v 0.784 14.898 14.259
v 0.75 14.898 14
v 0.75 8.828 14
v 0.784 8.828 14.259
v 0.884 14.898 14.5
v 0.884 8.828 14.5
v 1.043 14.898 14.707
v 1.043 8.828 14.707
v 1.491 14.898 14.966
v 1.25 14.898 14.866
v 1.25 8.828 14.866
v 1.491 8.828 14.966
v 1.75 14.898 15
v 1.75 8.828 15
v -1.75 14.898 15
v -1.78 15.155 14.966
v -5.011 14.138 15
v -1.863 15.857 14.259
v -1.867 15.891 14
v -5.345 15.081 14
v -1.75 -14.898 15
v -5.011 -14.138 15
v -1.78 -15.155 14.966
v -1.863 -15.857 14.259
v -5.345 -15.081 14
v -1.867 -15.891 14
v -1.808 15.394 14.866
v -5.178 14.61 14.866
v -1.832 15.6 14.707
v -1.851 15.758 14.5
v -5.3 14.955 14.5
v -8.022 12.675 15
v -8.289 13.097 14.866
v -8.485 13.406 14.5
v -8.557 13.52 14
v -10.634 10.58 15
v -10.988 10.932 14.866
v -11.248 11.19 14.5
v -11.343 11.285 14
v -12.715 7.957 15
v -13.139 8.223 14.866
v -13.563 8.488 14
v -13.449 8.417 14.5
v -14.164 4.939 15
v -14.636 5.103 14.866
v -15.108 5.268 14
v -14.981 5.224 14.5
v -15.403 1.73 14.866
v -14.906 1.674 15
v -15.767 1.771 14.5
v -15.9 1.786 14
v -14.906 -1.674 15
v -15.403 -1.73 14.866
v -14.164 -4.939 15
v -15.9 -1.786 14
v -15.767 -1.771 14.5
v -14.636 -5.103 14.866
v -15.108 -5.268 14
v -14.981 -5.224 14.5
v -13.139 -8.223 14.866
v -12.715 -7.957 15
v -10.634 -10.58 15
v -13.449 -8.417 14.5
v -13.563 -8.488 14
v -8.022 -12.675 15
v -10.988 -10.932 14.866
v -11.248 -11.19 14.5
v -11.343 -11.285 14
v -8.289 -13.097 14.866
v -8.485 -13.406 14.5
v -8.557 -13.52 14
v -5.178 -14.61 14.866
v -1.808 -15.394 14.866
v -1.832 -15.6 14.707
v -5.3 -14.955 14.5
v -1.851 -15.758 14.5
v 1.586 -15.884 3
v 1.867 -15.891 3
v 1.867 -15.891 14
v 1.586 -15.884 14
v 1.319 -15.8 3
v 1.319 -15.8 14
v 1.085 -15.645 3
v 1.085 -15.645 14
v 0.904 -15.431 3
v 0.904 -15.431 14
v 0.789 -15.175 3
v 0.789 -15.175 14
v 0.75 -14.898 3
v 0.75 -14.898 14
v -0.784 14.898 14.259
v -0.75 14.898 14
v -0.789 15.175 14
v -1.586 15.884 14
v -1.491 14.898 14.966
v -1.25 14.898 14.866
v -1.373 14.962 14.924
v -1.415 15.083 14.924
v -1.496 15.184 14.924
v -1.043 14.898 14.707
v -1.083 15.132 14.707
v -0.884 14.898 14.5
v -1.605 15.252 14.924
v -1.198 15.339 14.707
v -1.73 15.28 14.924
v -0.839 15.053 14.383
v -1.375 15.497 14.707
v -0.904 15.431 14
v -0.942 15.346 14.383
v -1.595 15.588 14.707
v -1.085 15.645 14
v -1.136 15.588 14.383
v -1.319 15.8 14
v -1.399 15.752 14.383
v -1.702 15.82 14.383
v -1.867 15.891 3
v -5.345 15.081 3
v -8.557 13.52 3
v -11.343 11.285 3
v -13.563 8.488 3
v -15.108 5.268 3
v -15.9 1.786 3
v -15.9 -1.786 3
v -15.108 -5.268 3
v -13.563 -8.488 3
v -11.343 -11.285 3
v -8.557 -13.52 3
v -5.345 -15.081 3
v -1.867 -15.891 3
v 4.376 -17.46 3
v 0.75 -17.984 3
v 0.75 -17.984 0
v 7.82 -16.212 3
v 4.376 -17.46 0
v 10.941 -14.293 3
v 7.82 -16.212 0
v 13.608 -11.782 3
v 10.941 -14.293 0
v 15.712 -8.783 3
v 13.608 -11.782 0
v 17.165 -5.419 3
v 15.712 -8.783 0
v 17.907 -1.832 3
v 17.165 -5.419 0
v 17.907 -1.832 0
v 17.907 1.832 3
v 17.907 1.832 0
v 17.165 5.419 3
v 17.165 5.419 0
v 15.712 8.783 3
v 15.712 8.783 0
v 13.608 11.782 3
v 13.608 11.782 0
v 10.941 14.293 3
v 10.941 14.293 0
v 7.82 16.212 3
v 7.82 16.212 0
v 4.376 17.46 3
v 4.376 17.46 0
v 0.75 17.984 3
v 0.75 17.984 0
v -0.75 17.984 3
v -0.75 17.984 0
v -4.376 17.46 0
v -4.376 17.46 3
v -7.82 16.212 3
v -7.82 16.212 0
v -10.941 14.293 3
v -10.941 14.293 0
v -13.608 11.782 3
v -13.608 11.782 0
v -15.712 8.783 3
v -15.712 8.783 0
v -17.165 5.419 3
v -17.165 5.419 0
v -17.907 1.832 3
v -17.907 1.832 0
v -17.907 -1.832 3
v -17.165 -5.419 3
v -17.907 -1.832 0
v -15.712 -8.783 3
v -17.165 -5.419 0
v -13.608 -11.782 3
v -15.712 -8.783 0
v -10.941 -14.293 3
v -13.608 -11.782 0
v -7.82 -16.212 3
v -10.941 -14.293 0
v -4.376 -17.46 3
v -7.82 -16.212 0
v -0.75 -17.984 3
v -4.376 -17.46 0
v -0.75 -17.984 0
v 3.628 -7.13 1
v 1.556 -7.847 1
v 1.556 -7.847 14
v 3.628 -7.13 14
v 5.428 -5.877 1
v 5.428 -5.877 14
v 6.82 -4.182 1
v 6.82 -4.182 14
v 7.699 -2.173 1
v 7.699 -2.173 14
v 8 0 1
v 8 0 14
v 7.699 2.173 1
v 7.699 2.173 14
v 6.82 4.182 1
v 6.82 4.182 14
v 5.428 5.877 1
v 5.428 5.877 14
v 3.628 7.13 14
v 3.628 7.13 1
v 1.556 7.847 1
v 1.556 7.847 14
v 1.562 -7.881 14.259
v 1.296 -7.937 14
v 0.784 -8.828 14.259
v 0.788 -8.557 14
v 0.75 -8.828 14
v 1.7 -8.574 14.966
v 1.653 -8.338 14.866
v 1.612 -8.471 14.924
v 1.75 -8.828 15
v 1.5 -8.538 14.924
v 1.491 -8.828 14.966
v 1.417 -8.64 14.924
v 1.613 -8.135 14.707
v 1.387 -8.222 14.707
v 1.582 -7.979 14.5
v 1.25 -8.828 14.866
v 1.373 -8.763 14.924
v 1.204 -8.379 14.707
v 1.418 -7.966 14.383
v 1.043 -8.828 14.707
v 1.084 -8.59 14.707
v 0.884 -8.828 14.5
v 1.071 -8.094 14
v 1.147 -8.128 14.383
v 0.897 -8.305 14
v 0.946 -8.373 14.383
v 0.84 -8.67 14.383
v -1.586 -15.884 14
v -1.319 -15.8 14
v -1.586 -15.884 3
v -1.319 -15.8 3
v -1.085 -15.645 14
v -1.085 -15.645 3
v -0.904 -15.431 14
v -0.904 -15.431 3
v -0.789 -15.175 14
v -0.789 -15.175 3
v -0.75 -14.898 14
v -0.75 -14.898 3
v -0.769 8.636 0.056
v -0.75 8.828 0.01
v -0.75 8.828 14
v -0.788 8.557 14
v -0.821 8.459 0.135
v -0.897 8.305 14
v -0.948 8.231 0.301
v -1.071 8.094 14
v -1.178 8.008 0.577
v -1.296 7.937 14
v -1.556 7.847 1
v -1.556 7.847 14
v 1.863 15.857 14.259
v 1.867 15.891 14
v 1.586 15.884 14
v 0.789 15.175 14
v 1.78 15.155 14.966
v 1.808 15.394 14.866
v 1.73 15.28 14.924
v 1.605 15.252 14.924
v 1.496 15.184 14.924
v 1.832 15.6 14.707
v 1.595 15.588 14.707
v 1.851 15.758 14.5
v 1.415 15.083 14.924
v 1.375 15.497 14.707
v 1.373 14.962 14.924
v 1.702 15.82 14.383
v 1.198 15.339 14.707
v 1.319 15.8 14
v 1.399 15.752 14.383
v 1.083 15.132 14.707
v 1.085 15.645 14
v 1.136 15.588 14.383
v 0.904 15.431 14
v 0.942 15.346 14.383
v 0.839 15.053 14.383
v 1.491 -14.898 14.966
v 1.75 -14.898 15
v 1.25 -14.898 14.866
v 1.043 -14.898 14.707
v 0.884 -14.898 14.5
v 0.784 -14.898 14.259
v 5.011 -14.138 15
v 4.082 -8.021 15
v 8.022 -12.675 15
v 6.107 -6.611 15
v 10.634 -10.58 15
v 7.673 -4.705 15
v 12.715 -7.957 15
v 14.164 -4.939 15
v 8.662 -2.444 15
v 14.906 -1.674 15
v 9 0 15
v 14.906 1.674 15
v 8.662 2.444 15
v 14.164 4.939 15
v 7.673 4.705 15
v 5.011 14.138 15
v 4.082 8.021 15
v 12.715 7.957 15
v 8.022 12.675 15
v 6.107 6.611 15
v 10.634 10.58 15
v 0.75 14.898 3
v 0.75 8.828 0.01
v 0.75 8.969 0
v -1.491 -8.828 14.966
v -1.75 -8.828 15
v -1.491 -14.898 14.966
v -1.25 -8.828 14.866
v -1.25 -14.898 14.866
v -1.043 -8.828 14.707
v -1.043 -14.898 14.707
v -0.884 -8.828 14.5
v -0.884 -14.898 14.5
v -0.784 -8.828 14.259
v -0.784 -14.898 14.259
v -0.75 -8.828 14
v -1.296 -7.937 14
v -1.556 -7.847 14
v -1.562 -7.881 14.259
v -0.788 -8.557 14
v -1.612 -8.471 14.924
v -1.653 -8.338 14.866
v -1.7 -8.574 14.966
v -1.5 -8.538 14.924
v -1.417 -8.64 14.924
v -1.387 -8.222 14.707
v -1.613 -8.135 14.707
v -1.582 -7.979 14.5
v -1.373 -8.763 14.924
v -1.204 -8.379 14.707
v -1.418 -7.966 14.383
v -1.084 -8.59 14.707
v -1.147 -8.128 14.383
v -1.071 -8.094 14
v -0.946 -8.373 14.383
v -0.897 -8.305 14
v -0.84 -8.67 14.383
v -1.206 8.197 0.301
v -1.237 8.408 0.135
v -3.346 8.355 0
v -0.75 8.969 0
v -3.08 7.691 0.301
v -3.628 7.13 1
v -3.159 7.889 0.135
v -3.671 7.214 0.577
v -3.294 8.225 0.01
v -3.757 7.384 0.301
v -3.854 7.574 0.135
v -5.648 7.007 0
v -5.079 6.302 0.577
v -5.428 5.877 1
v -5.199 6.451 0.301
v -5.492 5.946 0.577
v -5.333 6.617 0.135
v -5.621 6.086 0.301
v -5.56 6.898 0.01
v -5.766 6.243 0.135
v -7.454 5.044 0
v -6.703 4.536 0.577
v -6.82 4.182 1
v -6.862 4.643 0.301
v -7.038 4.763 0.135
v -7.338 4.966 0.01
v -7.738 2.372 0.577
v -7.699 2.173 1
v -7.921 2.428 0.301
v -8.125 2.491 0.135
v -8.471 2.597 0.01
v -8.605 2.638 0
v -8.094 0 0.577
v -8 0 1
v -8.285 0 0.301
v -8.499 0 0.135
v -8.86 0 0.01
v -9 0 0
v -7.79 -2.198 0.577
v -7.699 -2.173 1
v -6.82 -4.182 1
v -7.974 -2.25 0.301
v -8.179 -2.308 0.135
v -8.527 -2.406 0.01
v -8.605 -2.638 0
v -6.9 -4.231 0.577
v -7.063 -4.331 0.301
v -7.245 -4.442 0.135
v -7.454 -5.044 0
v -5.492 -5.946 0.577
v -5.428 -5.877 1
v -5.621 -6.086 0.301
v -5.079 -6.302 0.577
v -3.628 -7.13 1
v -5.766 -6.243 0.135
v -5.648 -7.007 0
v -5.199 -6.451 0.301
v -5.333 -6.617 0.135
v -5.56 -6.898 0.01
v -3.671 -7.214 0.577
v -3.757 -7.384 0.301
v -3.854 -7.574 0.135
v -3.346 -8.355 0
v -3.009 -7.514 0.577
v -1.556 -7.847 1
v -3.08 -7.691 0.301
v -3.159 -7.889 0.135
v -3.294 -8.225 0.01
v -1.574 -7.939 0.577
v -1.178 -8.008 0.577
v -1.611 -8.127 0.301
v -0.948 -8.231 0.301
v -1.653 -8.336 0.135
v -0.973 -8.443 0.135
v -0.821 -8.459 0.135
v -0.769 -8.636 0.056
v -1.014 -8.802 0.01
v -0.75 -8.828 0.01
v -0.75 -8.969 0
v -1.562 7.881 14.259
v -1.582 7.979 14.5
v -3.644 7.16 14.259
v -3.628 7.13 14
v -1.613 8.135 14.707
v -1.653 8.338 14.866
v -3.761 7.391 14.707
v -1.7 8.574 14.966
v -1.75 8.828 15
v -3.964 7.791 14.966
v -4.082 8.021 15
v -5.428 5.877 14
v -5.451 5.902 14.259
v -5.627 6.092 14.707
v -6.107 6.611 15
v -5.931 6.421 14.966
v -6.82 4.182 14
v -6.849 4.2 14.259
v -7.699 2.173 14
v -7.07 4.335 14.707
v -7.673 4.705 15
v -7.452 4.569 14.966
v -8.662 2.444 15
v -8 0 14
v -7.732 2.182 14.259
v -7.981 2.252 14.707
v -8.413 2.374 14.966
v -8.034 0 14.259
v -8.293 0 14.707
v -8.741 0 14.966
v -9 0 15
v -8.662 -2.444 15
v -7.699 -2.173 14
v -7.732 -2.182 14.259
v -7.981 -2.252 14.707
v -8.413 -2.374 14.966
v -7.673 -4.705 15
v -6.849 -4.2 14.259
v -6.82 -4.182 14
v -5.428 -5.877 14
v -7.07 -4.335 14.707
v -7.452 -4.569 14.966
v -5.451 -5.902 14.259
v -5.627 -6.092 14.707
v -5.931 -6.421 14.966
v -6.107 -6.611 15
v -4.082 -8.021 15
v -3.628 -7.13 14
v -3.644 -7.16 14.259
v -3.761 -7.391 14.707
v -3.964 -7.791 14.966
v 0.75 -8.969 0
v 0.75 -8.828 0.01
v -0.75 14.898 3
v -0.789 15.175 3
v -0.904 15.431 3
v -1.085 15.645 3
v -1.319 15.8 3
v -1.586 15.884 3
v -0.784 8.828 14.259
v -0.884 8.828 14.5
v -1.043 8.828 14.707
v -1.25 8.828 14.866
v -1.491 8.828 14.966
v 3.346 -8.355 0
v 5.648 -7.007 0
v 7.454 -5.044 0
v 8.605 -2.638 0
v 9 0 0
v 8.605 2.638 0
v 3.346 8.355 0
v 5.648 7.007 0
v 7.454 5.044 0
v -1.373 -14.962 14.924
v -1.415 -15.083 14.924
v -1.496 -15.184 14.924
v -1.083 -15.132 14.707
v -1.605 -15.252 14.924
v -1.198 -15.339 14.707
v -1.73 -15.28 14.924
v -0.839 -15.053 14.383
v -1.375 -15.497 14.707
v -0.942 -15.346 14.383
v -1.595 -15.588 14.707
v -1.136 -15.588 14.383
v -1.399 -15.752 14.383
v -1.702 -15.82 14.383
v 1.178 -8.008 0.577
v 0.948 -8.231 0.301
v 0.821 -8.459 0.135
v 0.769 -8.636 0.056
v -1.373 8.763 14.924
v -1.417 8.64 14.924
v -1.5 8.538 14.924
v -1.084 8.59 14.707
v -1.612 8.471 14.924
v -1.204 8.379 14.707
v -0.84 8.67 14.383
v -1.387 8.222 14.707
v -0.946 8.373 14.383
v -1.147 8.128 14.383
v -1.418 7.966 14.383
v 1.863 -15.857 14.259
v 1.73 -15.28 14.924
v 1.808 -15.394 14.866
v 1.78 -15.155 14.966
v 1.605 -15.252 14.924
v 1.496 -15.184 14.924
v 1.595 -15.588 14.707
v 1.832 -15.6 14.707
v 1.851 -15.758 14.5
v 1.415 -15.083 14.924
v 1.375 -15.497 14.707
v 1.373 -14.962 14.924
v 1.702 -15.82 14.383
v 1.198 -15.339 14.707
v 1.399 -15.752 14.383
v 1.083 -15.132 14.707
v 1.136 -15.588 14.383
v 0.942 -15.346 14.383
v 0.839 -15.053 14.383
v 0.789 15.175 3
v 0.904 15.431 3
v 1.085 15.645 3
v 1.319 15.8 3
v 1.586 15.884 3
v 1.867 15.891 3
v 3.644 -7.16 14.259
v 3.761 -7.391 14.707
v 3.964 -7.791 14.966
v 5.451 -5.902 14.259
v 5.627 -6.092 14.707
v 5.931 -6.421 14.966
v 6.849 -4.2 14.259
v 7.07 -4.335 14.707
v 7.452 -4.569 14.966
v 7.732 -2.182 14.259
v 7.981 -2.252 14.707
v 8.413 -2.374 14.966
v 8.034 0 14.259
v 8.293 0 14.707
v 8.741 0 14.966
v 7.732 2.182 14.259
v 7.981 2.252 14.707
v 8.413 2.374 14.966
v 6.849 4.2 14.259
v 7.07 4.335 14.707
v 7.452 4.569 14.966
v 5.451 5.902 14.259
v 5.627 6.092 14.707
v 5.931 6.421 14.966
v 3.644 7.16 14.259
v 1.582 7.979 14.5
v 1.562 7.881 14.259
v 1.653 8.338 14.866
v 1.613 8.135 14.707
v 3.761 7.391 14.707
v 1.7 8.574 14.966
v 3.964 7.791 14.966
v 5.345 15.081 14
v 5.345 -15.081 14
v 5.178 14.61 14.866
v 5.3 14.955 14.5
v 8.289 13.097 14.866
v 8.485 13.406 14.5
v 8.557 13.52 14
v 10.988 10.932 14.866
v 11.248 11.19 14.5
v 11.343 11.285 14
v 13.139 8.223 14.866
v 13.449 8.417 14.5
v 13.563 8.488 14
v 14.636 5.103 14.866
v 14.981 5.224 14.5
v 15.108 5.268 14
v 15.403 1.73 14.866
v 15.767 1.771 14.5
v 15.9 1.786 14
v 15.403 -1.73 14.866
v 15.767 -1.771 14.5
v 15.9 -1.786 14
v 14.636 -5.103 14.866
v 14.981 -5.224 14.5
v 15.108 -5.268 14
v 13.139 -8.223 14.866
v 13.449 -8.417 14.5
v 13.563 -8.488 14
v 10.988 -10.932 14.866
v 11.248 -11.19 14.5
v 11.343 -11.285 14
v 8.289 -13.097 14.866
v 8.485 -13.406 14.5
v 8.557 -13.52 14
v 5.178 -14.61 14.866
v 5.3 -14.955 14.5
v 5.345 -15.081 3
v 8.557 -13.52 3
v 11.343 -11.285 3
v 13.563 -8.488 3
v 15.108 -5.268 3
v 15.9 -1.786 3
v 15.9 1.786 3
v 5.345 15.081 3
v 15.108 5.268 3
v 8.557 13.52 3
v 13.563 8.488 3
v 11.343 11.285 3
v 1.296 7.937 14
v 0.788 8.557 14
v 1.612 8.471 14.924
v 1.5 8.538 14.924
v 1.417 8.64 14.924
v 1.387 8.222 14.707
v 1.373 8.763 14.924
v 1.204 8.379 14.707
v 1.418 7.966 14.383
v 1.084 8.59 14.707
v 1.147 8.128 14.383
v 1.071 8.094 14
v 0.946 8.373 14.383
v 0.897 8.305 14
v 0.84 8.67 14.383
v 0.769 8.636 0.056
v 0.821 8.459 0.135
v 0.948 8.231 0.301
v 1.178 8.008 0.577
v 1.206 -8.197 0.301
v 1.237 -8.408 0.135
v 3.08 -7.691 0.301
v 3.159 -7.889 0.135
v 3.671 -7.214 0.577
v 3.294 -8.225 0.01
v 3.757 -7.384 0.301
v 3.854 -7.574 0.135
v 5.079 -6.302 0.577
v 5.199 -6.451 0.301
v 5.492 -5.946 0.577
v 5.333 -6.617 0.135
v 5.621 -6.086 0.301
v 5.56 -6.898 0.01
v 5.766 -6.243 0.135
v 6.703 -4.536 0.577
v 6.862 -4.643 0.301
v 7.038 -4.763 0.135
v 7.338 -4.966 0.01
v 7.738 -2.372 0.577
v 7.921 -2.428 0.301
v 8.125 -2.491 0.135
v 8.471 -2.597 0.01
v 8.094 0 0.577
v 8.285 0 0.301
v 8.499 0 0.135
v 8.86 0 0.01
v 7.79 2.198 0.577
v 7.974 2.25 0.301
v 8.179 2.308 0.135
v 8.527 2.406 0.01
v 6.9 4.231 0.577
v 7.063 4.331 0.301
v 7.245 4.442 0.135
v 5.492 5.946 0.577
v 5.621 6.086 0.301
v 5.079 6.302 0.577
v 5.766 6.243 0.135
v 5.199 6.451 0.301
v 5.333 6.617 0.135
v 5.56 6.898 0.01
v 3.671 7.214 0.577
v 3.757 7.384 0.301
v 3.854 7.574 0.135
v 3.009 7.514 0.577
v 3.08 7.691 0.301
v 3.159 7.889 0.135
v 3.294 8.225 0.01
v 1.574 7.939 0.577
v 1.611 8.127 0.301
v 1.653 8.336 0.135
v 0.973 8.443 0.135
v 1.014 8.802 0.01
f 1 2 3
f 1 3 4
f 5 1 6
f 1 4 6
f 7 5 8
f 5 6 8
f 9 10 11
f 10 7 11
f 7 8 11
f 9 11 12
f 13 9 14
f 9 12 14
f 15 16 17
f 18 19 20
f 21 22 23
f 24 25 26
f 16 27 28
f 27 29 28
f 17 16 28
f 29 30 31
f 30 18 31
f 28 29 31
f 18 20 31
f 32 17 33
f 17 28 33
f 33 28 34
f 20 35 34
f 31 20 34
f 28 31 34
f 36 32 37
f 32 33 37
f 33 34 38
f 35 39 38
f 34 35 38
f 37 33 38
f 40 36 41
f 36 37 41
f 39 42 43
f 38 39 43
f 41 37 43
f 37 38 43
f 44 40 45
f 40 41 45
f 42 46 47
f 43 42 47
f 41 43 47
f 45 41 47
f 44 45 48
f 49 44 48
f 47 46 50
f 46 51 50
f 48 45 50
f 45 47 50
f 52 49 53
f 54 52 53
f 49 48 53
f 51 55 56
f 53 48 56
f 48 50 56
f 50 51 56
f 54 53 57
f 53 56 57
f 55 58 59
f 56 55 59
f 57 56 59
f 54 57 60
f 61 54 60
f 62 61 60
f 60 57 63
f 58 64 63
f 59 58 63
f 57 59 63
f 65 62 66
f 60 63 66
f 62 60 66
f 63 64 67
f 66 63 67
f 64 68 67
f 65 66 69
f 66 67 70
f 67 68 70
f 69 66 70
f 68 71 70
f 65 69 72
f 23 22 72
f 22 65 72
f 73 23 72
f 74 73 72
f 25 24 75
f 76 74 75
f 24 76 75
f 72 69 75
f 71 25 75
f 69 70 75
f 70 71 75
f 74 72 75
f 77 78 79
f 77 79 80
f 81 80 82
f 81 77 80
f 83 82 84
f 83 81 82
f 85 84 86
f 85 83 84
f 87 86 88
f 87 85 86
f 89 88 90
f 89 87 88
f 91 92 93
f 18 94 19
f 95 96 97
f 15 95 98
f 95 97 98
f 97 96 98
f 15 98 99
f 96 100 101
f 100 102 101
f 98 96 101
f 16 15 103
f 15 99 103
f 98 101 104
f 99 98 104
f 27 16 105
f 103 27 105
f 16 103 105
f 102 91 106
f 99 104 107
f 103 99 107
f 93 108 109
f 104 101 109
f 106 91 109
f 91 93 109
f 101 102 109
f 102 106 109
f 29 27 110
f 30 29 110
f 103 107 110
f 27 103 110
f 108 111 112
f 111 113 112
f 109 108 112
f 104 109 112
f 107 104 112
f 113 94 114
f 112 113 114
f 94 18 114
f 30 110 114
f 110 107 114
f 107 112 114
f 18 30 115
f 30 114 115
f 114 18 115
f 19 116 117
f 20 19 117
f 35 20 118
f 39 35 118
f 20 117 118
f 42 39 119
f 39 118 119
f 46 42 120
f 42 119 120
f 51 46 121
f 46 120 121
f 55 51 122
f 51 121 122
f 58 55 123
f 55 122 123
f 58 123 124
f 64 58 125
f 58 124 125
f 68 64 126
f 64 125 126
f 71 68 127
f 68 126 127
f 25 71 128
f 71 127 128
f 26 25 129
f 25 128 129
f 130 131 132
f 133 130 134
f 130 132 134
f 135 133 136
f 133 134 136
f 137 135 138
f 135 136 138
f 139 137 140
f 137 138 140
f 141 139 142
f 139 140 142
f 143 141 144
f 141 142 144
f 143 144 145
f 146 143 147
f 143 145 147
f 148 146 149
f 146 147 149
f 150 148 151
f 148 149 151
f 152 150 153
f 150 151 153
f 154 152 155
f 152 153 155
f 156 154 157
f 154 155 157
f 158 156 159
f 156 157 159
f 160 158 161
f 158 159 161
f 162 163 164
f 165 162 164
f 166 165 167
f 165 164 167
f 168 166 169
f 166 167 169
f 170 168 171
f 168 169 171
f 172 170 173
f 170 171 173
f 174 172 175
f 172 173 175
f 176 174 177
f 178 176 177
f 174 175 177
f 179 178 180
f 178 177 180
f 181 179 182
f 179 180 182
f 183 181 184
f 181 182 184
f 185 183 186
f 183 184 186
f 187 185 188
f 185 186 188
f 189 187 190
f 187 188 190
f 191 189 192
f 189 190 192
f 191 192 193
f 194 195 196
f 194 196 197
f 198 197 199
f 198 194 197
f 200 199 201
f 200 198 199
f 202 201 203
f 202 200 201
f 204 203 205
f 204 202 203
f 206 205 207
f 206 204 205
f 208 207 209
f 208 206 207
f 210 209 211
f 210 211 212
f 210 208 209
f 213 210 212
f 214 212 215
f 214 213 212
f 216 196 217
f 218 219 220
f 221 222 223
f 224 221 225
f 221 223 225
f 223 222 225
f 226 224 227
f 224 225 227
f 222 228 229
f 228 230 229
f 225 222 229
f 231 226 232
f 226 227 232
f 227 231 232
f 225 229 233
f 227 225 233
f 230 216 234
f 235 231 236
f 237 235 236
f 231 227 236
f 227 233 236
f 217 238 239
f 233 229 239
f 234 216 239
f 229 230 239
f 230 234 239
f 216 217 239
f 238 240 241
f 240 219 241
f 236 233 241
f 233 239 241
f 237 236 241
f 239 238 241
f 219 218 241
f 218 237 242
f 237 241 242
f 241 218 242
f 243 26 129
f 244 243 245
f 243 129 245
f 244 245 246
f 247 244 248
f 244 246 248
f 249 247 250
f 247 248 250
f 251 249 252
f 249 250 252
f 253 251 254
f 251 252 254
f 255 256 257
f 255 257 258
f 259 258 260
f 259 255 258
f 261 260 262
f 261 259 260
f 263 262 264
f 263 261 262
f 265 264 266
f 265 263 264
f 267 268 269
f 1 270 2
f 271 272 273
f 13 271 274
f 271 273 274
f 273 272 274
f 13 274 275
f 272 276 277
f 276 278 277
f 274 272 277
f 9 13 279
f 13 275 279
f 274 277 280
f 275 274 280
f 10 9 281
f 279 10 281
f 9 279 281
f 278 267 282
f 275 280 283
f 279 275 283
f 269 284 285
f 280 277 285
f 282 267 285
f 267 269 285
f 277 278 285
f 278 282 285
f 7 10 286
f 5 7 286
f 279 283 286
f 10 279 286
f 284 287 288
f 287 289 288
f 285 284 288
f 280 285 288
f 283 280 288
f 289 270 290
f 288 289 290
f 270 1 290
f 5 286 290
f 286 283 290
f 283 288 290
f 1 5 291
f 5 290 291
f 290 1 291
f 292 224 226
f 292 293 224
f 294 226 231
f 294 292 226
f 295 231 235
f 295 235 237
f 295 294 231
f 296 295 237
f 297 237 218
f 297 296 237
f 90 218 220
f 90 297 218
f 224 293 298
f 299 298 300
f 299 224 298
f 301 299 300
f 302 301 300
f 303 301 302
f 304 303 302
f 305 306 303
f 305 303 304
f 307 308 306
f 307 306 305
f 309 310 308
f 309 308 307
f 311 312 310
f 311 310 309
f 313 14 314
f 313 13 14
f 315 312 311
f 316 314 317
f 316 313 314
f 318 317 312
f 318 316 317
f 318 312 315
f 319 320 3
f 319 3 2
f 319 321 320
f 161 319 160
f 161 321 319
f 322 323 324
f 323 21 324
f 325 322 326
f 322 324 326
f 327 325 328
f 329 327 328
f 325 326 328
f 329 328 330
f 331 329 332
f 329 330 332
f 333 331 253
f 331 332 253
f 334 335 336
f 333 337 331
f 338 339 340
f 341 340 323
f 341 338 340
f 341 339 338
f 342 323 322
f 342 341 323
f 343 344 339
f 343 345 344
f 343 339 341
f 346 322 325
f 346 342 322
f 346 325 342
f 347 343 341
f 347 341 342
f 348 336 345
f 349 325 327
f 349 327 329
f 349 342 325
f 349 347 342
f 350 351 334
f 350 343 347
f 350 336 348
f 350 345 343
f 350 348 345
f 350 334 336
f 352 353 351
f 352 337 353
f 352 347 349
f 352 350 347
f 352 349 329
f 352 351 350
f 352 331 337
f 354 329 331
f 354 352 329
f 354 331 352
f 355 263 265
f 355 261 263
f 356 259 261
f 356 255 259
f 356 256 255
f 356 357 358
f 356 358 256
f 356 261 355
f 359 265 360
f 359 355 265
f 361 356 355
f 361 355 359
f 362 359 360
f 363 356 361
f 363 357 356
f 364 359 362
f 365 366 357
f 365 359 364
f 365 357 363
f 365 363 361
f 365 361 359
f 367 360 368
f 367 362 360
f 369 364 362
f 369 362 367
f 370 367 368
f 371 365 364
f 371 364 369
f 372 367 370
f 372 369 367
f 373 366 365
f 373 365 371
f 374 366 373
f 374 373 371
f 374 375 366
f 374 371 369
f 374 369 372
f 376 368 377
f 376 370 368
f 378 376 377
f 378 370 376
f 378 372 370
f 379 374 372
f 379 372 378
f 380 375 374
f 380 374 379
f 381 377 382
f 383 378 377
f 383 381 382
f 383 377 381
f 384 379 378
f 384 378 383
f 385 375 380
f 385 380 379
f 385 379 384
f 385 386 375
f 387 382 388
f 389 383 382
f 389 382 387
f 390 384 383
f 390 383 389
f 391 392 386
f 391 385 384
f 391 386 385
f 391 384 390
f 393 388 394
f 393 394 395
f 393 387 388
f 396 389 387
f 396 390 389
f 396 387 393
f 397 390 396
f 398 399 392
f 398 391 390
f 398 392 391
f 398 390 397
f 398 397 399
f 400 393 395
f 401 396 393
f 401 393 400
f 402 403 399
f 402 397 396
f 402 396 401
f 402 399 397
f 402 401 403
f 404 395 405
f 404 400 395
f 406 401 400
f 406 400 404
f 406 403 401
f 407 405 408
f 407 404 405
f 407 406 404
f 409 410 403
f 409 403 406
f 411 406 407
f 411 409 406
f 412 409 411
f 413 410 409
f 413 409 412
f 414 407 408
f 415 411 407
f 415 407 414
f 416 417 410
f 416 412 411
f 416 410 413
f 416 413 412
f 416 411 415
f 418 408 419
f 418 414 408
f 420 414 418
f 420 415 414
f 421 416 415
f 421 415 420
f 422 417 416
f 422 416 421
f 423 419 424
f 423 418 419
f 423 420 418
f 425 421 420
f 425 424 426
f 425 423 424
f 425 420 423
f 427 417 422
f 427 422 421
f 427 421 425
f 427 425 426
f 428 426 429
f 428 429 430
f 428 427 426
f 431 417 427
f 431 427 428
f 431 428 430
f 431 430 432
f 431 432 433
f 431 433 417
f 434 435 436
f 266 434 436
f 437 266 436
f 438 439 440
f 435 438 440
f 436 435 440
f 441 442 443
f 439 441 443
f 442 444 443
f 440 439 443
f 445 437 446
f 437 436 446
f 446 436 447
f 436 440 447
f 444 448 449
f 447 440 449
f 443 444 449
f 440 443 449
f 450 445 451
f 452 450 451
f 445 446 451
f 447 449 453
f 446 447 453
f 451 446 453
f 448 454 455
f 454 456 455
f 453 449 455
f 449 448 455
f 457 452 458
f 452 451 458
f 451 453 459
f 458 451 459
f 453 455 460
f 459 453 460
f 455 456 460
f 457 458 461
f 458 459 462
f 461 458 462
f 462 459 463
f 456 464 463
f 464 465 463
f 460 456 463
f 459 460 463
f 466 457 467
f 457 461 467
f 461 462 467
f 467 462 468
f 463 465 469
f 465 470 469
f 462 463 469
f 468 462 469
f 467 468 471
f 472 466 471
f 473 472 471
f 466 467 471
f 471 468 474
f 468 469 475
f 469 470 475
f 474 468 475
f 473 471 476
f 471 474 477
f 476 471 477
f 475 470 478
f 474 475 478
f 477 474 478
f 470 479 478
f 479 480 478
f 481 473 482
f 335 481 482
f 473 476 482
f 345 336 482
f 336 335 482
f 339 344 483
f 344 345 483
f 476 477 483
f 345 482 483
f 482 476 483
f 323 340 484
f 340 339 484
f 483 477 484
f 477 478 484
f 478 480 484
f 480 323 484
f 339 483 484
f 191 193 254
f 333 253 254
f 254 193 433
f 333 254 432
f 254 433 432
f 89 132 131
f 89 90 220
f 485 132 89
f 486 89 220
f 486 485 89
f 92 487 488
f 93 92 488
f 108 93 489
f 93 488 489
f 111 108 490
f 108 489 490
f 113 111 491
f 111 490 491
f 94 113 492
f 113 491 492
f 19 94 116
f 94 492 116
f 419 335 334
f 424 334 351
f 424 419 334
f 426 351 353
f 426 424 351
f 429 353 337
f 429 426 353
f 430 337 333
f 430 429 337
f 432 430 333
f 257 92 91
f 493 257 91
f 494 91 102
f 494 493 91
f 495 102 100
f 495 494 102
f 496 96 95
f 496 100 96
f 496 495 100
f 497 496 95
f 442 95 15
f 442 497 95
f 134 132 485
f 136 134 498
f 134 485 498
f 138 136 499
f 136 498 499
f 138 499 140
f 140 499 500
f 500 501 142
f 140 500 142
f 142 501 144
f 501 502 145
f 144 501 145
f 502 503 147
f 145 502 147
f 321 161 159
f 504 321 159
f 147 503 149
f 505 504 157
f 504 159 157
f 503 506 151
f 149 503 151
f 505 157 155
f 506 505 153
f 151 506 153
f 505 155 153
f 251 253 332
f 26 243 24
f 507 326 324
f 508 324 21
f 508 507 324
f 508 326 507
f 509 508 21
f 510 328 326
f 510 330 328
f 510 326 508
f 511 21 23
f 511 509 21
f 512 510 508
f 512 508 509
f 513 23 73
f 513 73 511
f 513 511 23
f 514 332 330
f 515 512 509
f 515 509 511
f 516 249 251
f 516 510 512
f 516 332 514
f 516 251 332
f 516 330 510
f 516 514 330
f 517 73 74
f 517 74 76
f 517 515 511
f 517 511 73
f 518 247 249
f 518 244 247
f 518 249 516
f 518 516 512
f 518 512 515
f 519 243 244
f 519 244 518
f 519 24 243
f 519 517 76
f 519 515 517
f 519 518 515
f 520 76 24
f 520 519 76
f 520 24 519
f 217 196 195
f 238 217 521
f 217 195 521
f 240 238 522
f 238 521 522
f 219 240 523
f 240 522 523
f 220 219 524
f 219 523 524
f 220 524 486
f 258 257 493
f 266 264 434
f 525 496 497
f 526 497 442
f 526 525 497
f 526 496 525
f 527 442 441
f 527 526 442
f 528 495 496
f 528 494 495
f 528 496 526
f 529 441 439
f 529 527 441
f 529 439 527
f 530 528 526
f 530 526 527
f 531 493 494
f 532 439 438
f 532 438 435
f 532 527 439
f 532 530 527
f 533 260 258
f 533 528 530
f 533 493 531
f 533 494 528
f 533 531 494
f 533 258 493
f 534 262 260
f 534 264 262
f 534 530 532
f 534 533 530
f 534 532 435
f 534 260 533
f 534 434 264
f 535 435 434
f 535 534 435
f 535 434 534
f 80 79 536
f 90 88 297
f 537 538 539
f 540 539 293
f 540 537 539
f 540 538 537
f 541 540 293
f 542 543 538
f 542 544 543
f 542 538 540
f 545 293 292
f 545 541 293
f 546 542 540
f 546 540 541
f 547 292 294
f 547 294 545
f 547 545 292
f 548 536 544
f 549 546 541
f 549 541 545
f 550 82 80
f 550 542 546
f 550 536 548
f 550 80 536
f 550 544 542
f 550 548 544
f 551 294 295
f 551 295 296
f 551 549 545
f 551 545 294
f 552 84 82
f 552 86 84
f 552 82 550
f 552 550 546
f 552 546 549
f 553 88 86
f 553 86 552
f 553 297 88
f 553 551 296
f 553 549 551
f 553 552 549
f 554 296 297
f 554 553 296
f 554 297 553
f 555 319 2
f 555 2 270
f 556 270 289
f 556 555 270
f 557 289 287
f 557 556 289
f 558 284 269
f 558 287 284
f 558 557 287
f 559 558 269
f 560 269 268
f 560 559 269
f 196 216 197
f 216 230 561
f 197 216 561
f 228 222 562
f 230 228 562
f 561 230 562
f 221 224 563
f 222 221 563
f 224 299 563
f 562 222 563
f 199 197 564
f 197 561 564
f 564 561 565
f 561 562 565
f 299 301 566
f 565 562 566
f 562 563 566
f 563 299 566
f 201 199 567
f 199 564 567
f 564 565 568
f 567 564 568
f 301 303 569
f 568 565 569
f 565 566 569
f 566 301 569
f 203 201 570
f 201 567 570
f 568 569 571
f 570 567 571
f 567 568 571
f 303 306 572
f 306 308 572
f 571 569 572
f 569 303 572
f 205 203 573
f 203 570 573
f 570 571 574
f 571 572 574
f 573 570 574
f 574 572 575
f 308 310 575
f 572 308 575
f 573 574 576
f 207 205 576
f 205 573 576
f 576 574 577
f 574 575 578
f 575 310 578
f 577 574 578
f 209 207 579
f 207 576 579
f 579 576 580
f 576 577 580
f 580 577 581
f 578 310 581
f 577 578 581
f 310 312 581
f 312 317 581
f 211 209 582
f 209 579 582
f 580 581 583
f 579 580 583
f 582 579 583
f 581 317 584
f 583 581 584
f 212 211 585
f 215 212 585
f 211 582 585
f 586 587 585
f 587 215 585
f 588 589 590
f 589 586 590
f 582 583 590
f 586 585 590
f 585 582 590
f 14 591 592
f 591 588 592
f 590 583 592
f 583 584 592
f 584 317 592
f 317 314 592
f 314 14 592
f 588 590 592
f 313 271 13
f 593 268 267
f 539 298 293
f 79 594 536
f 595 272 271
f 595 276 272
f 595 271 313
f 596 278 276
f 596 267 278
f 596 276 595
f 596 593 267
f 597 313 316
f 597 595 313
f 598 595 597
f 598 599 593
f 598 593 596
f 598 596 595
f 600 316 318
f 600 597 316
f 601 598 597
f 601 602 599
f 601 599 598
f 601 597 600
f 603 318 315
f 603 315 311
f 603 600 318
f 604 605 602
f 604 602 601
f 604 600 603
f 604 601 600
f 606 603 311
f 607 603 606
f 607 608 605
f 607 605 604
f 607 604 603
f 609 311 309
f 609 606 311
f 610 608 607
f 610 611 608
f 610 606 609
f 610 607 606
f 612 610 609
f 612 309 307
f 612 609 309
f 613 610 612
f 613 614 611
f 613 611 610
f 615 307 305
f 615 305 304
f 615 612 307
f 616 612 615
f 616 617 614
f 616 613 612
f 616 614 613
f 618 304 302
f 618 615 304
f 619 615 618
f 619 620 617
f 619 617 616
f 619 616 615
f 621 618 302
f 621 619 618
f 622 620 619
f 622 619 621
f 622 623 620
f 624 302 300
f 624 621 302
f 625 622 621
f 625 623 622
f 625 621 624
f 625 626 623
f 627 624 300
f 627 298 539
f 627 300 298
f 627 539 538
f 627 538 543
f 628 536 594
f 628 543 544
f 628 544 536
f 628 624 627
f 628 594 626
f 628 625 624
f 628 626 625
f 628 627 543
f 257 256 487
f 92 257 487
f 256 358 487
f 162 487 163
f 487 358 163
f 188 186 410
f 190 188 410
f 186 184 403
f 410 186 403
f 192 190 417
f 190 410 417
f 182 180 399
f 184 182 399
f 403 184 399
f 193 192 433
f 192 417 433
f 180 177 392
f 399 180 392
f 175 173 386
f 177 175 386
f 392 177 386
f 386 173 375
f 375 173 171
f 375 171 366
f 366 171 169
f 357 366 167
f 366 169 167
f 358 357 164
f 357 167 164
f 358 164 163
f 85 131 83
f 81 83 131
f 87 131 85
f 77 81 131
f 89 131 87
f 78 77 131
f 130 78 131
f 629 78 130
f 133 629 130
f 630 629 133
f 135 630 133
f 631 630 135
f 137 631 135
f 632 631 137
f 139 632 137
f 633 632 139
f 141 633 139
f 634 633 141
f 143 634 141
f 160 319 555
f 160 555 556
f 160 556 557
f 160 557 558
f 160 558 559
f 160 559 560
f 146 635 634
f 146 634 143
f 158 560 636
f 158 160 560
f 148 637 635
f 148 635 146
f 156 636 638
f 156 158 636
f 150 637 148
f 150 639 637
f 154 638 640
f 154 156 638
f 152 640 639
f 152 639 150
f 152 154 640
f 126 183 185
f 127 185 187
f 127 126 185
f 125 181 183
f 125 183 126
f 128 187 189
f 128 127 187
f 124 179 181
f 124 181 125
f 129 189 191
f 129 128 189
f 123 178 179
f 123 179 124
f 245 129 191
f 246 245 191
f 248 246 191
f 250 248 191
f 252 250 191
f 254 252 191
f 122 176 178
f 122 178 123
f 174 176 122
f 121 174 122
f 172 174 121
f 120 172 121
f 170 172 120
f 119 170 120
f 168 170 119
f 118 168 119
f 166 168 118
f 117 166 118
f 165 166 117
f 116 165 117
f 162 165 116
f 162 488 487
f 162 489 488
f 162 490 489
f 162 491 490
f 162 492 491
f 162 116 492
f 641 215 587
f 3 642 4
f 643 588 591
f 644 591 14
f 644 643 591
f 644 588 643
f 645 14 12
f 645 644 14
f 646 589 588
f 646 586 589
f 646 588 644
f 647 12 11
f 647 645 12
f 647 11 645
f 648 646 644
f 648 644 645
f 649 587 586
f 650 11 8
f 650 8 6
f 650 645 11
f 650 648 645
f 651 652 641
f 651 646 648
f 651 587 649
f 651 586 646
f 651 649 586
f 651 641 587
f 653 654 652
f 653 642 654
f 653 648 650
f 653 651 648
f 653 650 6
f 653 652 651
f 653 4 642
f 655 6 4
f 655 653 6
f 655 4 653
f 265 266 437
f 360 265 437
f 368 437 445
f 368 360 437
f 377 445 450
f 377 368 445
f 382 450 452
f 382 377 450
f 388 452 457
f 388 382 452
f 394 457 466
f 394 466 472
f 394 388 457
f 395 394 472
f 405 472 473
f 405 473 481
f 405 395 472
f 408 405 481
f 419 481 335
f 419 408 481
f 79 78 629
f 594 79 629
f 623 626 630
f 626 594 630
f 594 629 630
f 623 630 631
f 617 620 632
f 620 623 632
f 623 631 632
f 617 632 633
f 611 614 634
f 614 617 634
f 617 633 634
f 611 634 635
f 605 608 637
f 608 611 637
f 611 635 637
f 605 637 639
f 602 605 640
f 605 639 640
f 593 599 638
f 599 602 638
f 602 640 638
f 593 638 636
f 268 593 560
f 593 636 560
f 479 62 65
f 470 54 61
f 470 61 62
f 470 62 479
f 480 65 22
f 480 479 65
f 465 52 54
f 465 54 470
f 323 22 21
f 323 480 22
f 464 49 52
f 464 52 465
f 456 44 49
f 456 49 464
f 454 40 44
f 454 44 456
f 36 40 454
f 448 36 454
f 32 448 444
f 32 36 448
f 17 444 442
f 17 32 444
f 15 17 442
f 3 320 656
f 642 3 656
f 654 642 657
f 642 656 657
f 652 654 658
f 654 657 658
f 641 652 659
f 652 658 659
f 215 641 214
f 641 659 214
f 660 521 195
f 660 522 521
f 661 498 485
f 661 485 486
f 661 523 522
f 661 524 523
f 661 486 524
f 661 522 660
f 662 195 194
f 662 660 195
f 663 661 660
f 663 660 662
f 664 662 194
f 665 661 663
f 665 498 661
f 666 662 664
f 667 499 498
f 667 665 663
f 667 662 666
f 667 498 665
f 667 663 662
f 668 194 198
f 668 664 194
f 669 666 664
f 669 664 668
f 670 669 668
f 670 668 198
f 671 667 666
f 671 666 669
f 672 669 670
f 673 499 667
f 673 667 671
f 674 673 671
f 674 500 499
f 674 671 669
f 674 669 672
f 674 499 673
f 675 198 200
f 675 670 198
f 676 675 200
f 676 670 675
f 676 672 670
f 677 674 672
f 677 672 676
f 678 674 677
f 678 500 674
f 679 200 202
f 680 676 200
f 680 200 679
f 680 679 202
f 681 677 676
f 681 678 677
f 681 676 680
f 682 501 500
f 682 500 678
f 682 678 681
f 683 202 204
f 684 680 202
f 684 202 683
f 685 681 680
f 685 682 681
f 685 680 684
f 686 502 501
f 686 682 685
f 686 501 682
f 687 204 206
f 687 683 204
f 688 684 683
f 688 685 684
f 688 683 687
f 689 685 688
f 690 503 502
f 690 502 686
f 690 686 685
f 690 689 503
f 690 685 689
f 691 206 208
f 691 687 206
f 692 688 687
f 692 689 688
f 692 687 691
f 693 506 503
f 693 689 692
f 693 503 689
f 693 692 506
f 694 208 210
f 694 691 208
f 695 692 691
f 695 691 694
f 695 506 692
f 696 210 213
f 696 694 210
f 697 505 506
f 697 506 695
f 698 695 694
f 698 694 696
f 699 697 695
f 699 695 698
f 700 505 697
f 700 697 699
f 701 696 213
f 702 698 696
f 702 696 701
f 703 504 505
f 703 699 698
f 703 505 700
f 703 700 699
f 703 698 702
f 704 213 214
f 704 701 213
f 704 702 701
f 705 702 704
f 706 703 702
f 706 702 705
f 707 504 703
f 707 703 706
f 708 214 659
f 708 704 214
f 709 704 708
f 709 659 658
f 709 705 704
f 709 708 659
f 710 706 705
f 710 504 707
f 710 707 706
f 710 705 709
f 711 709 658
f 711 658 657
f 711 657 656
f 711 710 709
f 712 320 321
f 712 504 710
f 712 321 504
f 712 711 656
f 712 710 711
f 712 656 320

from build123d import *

# Parameters (mm, degrees)
F0_R     = 16
F0_R_2   = 8
F1_DEPTH = 15
F0_R_3   = 18
F2_DEPTH = 3
F3_W     = 1.5
F3_H     = 40
F4_DEPTH = 15.001
F5_R     = 1


with BuildPart() as f1:
    # F0 (on Top) → F1 (new body)
    with BuildSketch(Plane.XY):
        Circle(F0_R)
        Circle(F0_R_2, mode=Mode.SUBTRACT)
    extrude(amount=F1_DEPTH)

    # F0 (on Top) → F2 (join)
    with BuildSketch(Plane.XY):
        Circle(F0_R_3)
        Circle(F0_R, mode=Mode.SUBTRACT)
    extrude(amount=F2_DEPTH)

    # F3 (on Top) → F4 (cut, through all)
    with BuildSketch(Plane.XY):
        Rectangle(F3_W, F3_H)
    extrude(amount=F4_DEPTH, mode=Mode.SUBTRACT)

    # F5
    f5_edges = [f1.edges().sort_by_distance(p)[0] for p in [
        (-8, 0, 0),
        (8, 0, 0),
        (-0.75, 11.973589, 15),
        (-8, 0, 15),
        (-0.75, -11.973589, 15),
        (-16, 0, 15),
        (8, 0, 15),
        (16, 0, 15),
        (0.75, -11.973589, 15),
        (0.75, 11.973589, 15),
        (-0.75, -15.982412, 9),
        (-0.75, 15.982412, 9),
        (0.75, 15.982412, 9),
        (0.75, -15.982412, 9),
        (-0.75, -7.964766, 7.5),
        (-0.75, 7.964766, 7.5),
        (0.75, 7.964766, 7.5),
        (0.75, -7.964766, 7.5),
    ]]
    fillet(f5_edges, radius=F5_R)


solid = f1.part
